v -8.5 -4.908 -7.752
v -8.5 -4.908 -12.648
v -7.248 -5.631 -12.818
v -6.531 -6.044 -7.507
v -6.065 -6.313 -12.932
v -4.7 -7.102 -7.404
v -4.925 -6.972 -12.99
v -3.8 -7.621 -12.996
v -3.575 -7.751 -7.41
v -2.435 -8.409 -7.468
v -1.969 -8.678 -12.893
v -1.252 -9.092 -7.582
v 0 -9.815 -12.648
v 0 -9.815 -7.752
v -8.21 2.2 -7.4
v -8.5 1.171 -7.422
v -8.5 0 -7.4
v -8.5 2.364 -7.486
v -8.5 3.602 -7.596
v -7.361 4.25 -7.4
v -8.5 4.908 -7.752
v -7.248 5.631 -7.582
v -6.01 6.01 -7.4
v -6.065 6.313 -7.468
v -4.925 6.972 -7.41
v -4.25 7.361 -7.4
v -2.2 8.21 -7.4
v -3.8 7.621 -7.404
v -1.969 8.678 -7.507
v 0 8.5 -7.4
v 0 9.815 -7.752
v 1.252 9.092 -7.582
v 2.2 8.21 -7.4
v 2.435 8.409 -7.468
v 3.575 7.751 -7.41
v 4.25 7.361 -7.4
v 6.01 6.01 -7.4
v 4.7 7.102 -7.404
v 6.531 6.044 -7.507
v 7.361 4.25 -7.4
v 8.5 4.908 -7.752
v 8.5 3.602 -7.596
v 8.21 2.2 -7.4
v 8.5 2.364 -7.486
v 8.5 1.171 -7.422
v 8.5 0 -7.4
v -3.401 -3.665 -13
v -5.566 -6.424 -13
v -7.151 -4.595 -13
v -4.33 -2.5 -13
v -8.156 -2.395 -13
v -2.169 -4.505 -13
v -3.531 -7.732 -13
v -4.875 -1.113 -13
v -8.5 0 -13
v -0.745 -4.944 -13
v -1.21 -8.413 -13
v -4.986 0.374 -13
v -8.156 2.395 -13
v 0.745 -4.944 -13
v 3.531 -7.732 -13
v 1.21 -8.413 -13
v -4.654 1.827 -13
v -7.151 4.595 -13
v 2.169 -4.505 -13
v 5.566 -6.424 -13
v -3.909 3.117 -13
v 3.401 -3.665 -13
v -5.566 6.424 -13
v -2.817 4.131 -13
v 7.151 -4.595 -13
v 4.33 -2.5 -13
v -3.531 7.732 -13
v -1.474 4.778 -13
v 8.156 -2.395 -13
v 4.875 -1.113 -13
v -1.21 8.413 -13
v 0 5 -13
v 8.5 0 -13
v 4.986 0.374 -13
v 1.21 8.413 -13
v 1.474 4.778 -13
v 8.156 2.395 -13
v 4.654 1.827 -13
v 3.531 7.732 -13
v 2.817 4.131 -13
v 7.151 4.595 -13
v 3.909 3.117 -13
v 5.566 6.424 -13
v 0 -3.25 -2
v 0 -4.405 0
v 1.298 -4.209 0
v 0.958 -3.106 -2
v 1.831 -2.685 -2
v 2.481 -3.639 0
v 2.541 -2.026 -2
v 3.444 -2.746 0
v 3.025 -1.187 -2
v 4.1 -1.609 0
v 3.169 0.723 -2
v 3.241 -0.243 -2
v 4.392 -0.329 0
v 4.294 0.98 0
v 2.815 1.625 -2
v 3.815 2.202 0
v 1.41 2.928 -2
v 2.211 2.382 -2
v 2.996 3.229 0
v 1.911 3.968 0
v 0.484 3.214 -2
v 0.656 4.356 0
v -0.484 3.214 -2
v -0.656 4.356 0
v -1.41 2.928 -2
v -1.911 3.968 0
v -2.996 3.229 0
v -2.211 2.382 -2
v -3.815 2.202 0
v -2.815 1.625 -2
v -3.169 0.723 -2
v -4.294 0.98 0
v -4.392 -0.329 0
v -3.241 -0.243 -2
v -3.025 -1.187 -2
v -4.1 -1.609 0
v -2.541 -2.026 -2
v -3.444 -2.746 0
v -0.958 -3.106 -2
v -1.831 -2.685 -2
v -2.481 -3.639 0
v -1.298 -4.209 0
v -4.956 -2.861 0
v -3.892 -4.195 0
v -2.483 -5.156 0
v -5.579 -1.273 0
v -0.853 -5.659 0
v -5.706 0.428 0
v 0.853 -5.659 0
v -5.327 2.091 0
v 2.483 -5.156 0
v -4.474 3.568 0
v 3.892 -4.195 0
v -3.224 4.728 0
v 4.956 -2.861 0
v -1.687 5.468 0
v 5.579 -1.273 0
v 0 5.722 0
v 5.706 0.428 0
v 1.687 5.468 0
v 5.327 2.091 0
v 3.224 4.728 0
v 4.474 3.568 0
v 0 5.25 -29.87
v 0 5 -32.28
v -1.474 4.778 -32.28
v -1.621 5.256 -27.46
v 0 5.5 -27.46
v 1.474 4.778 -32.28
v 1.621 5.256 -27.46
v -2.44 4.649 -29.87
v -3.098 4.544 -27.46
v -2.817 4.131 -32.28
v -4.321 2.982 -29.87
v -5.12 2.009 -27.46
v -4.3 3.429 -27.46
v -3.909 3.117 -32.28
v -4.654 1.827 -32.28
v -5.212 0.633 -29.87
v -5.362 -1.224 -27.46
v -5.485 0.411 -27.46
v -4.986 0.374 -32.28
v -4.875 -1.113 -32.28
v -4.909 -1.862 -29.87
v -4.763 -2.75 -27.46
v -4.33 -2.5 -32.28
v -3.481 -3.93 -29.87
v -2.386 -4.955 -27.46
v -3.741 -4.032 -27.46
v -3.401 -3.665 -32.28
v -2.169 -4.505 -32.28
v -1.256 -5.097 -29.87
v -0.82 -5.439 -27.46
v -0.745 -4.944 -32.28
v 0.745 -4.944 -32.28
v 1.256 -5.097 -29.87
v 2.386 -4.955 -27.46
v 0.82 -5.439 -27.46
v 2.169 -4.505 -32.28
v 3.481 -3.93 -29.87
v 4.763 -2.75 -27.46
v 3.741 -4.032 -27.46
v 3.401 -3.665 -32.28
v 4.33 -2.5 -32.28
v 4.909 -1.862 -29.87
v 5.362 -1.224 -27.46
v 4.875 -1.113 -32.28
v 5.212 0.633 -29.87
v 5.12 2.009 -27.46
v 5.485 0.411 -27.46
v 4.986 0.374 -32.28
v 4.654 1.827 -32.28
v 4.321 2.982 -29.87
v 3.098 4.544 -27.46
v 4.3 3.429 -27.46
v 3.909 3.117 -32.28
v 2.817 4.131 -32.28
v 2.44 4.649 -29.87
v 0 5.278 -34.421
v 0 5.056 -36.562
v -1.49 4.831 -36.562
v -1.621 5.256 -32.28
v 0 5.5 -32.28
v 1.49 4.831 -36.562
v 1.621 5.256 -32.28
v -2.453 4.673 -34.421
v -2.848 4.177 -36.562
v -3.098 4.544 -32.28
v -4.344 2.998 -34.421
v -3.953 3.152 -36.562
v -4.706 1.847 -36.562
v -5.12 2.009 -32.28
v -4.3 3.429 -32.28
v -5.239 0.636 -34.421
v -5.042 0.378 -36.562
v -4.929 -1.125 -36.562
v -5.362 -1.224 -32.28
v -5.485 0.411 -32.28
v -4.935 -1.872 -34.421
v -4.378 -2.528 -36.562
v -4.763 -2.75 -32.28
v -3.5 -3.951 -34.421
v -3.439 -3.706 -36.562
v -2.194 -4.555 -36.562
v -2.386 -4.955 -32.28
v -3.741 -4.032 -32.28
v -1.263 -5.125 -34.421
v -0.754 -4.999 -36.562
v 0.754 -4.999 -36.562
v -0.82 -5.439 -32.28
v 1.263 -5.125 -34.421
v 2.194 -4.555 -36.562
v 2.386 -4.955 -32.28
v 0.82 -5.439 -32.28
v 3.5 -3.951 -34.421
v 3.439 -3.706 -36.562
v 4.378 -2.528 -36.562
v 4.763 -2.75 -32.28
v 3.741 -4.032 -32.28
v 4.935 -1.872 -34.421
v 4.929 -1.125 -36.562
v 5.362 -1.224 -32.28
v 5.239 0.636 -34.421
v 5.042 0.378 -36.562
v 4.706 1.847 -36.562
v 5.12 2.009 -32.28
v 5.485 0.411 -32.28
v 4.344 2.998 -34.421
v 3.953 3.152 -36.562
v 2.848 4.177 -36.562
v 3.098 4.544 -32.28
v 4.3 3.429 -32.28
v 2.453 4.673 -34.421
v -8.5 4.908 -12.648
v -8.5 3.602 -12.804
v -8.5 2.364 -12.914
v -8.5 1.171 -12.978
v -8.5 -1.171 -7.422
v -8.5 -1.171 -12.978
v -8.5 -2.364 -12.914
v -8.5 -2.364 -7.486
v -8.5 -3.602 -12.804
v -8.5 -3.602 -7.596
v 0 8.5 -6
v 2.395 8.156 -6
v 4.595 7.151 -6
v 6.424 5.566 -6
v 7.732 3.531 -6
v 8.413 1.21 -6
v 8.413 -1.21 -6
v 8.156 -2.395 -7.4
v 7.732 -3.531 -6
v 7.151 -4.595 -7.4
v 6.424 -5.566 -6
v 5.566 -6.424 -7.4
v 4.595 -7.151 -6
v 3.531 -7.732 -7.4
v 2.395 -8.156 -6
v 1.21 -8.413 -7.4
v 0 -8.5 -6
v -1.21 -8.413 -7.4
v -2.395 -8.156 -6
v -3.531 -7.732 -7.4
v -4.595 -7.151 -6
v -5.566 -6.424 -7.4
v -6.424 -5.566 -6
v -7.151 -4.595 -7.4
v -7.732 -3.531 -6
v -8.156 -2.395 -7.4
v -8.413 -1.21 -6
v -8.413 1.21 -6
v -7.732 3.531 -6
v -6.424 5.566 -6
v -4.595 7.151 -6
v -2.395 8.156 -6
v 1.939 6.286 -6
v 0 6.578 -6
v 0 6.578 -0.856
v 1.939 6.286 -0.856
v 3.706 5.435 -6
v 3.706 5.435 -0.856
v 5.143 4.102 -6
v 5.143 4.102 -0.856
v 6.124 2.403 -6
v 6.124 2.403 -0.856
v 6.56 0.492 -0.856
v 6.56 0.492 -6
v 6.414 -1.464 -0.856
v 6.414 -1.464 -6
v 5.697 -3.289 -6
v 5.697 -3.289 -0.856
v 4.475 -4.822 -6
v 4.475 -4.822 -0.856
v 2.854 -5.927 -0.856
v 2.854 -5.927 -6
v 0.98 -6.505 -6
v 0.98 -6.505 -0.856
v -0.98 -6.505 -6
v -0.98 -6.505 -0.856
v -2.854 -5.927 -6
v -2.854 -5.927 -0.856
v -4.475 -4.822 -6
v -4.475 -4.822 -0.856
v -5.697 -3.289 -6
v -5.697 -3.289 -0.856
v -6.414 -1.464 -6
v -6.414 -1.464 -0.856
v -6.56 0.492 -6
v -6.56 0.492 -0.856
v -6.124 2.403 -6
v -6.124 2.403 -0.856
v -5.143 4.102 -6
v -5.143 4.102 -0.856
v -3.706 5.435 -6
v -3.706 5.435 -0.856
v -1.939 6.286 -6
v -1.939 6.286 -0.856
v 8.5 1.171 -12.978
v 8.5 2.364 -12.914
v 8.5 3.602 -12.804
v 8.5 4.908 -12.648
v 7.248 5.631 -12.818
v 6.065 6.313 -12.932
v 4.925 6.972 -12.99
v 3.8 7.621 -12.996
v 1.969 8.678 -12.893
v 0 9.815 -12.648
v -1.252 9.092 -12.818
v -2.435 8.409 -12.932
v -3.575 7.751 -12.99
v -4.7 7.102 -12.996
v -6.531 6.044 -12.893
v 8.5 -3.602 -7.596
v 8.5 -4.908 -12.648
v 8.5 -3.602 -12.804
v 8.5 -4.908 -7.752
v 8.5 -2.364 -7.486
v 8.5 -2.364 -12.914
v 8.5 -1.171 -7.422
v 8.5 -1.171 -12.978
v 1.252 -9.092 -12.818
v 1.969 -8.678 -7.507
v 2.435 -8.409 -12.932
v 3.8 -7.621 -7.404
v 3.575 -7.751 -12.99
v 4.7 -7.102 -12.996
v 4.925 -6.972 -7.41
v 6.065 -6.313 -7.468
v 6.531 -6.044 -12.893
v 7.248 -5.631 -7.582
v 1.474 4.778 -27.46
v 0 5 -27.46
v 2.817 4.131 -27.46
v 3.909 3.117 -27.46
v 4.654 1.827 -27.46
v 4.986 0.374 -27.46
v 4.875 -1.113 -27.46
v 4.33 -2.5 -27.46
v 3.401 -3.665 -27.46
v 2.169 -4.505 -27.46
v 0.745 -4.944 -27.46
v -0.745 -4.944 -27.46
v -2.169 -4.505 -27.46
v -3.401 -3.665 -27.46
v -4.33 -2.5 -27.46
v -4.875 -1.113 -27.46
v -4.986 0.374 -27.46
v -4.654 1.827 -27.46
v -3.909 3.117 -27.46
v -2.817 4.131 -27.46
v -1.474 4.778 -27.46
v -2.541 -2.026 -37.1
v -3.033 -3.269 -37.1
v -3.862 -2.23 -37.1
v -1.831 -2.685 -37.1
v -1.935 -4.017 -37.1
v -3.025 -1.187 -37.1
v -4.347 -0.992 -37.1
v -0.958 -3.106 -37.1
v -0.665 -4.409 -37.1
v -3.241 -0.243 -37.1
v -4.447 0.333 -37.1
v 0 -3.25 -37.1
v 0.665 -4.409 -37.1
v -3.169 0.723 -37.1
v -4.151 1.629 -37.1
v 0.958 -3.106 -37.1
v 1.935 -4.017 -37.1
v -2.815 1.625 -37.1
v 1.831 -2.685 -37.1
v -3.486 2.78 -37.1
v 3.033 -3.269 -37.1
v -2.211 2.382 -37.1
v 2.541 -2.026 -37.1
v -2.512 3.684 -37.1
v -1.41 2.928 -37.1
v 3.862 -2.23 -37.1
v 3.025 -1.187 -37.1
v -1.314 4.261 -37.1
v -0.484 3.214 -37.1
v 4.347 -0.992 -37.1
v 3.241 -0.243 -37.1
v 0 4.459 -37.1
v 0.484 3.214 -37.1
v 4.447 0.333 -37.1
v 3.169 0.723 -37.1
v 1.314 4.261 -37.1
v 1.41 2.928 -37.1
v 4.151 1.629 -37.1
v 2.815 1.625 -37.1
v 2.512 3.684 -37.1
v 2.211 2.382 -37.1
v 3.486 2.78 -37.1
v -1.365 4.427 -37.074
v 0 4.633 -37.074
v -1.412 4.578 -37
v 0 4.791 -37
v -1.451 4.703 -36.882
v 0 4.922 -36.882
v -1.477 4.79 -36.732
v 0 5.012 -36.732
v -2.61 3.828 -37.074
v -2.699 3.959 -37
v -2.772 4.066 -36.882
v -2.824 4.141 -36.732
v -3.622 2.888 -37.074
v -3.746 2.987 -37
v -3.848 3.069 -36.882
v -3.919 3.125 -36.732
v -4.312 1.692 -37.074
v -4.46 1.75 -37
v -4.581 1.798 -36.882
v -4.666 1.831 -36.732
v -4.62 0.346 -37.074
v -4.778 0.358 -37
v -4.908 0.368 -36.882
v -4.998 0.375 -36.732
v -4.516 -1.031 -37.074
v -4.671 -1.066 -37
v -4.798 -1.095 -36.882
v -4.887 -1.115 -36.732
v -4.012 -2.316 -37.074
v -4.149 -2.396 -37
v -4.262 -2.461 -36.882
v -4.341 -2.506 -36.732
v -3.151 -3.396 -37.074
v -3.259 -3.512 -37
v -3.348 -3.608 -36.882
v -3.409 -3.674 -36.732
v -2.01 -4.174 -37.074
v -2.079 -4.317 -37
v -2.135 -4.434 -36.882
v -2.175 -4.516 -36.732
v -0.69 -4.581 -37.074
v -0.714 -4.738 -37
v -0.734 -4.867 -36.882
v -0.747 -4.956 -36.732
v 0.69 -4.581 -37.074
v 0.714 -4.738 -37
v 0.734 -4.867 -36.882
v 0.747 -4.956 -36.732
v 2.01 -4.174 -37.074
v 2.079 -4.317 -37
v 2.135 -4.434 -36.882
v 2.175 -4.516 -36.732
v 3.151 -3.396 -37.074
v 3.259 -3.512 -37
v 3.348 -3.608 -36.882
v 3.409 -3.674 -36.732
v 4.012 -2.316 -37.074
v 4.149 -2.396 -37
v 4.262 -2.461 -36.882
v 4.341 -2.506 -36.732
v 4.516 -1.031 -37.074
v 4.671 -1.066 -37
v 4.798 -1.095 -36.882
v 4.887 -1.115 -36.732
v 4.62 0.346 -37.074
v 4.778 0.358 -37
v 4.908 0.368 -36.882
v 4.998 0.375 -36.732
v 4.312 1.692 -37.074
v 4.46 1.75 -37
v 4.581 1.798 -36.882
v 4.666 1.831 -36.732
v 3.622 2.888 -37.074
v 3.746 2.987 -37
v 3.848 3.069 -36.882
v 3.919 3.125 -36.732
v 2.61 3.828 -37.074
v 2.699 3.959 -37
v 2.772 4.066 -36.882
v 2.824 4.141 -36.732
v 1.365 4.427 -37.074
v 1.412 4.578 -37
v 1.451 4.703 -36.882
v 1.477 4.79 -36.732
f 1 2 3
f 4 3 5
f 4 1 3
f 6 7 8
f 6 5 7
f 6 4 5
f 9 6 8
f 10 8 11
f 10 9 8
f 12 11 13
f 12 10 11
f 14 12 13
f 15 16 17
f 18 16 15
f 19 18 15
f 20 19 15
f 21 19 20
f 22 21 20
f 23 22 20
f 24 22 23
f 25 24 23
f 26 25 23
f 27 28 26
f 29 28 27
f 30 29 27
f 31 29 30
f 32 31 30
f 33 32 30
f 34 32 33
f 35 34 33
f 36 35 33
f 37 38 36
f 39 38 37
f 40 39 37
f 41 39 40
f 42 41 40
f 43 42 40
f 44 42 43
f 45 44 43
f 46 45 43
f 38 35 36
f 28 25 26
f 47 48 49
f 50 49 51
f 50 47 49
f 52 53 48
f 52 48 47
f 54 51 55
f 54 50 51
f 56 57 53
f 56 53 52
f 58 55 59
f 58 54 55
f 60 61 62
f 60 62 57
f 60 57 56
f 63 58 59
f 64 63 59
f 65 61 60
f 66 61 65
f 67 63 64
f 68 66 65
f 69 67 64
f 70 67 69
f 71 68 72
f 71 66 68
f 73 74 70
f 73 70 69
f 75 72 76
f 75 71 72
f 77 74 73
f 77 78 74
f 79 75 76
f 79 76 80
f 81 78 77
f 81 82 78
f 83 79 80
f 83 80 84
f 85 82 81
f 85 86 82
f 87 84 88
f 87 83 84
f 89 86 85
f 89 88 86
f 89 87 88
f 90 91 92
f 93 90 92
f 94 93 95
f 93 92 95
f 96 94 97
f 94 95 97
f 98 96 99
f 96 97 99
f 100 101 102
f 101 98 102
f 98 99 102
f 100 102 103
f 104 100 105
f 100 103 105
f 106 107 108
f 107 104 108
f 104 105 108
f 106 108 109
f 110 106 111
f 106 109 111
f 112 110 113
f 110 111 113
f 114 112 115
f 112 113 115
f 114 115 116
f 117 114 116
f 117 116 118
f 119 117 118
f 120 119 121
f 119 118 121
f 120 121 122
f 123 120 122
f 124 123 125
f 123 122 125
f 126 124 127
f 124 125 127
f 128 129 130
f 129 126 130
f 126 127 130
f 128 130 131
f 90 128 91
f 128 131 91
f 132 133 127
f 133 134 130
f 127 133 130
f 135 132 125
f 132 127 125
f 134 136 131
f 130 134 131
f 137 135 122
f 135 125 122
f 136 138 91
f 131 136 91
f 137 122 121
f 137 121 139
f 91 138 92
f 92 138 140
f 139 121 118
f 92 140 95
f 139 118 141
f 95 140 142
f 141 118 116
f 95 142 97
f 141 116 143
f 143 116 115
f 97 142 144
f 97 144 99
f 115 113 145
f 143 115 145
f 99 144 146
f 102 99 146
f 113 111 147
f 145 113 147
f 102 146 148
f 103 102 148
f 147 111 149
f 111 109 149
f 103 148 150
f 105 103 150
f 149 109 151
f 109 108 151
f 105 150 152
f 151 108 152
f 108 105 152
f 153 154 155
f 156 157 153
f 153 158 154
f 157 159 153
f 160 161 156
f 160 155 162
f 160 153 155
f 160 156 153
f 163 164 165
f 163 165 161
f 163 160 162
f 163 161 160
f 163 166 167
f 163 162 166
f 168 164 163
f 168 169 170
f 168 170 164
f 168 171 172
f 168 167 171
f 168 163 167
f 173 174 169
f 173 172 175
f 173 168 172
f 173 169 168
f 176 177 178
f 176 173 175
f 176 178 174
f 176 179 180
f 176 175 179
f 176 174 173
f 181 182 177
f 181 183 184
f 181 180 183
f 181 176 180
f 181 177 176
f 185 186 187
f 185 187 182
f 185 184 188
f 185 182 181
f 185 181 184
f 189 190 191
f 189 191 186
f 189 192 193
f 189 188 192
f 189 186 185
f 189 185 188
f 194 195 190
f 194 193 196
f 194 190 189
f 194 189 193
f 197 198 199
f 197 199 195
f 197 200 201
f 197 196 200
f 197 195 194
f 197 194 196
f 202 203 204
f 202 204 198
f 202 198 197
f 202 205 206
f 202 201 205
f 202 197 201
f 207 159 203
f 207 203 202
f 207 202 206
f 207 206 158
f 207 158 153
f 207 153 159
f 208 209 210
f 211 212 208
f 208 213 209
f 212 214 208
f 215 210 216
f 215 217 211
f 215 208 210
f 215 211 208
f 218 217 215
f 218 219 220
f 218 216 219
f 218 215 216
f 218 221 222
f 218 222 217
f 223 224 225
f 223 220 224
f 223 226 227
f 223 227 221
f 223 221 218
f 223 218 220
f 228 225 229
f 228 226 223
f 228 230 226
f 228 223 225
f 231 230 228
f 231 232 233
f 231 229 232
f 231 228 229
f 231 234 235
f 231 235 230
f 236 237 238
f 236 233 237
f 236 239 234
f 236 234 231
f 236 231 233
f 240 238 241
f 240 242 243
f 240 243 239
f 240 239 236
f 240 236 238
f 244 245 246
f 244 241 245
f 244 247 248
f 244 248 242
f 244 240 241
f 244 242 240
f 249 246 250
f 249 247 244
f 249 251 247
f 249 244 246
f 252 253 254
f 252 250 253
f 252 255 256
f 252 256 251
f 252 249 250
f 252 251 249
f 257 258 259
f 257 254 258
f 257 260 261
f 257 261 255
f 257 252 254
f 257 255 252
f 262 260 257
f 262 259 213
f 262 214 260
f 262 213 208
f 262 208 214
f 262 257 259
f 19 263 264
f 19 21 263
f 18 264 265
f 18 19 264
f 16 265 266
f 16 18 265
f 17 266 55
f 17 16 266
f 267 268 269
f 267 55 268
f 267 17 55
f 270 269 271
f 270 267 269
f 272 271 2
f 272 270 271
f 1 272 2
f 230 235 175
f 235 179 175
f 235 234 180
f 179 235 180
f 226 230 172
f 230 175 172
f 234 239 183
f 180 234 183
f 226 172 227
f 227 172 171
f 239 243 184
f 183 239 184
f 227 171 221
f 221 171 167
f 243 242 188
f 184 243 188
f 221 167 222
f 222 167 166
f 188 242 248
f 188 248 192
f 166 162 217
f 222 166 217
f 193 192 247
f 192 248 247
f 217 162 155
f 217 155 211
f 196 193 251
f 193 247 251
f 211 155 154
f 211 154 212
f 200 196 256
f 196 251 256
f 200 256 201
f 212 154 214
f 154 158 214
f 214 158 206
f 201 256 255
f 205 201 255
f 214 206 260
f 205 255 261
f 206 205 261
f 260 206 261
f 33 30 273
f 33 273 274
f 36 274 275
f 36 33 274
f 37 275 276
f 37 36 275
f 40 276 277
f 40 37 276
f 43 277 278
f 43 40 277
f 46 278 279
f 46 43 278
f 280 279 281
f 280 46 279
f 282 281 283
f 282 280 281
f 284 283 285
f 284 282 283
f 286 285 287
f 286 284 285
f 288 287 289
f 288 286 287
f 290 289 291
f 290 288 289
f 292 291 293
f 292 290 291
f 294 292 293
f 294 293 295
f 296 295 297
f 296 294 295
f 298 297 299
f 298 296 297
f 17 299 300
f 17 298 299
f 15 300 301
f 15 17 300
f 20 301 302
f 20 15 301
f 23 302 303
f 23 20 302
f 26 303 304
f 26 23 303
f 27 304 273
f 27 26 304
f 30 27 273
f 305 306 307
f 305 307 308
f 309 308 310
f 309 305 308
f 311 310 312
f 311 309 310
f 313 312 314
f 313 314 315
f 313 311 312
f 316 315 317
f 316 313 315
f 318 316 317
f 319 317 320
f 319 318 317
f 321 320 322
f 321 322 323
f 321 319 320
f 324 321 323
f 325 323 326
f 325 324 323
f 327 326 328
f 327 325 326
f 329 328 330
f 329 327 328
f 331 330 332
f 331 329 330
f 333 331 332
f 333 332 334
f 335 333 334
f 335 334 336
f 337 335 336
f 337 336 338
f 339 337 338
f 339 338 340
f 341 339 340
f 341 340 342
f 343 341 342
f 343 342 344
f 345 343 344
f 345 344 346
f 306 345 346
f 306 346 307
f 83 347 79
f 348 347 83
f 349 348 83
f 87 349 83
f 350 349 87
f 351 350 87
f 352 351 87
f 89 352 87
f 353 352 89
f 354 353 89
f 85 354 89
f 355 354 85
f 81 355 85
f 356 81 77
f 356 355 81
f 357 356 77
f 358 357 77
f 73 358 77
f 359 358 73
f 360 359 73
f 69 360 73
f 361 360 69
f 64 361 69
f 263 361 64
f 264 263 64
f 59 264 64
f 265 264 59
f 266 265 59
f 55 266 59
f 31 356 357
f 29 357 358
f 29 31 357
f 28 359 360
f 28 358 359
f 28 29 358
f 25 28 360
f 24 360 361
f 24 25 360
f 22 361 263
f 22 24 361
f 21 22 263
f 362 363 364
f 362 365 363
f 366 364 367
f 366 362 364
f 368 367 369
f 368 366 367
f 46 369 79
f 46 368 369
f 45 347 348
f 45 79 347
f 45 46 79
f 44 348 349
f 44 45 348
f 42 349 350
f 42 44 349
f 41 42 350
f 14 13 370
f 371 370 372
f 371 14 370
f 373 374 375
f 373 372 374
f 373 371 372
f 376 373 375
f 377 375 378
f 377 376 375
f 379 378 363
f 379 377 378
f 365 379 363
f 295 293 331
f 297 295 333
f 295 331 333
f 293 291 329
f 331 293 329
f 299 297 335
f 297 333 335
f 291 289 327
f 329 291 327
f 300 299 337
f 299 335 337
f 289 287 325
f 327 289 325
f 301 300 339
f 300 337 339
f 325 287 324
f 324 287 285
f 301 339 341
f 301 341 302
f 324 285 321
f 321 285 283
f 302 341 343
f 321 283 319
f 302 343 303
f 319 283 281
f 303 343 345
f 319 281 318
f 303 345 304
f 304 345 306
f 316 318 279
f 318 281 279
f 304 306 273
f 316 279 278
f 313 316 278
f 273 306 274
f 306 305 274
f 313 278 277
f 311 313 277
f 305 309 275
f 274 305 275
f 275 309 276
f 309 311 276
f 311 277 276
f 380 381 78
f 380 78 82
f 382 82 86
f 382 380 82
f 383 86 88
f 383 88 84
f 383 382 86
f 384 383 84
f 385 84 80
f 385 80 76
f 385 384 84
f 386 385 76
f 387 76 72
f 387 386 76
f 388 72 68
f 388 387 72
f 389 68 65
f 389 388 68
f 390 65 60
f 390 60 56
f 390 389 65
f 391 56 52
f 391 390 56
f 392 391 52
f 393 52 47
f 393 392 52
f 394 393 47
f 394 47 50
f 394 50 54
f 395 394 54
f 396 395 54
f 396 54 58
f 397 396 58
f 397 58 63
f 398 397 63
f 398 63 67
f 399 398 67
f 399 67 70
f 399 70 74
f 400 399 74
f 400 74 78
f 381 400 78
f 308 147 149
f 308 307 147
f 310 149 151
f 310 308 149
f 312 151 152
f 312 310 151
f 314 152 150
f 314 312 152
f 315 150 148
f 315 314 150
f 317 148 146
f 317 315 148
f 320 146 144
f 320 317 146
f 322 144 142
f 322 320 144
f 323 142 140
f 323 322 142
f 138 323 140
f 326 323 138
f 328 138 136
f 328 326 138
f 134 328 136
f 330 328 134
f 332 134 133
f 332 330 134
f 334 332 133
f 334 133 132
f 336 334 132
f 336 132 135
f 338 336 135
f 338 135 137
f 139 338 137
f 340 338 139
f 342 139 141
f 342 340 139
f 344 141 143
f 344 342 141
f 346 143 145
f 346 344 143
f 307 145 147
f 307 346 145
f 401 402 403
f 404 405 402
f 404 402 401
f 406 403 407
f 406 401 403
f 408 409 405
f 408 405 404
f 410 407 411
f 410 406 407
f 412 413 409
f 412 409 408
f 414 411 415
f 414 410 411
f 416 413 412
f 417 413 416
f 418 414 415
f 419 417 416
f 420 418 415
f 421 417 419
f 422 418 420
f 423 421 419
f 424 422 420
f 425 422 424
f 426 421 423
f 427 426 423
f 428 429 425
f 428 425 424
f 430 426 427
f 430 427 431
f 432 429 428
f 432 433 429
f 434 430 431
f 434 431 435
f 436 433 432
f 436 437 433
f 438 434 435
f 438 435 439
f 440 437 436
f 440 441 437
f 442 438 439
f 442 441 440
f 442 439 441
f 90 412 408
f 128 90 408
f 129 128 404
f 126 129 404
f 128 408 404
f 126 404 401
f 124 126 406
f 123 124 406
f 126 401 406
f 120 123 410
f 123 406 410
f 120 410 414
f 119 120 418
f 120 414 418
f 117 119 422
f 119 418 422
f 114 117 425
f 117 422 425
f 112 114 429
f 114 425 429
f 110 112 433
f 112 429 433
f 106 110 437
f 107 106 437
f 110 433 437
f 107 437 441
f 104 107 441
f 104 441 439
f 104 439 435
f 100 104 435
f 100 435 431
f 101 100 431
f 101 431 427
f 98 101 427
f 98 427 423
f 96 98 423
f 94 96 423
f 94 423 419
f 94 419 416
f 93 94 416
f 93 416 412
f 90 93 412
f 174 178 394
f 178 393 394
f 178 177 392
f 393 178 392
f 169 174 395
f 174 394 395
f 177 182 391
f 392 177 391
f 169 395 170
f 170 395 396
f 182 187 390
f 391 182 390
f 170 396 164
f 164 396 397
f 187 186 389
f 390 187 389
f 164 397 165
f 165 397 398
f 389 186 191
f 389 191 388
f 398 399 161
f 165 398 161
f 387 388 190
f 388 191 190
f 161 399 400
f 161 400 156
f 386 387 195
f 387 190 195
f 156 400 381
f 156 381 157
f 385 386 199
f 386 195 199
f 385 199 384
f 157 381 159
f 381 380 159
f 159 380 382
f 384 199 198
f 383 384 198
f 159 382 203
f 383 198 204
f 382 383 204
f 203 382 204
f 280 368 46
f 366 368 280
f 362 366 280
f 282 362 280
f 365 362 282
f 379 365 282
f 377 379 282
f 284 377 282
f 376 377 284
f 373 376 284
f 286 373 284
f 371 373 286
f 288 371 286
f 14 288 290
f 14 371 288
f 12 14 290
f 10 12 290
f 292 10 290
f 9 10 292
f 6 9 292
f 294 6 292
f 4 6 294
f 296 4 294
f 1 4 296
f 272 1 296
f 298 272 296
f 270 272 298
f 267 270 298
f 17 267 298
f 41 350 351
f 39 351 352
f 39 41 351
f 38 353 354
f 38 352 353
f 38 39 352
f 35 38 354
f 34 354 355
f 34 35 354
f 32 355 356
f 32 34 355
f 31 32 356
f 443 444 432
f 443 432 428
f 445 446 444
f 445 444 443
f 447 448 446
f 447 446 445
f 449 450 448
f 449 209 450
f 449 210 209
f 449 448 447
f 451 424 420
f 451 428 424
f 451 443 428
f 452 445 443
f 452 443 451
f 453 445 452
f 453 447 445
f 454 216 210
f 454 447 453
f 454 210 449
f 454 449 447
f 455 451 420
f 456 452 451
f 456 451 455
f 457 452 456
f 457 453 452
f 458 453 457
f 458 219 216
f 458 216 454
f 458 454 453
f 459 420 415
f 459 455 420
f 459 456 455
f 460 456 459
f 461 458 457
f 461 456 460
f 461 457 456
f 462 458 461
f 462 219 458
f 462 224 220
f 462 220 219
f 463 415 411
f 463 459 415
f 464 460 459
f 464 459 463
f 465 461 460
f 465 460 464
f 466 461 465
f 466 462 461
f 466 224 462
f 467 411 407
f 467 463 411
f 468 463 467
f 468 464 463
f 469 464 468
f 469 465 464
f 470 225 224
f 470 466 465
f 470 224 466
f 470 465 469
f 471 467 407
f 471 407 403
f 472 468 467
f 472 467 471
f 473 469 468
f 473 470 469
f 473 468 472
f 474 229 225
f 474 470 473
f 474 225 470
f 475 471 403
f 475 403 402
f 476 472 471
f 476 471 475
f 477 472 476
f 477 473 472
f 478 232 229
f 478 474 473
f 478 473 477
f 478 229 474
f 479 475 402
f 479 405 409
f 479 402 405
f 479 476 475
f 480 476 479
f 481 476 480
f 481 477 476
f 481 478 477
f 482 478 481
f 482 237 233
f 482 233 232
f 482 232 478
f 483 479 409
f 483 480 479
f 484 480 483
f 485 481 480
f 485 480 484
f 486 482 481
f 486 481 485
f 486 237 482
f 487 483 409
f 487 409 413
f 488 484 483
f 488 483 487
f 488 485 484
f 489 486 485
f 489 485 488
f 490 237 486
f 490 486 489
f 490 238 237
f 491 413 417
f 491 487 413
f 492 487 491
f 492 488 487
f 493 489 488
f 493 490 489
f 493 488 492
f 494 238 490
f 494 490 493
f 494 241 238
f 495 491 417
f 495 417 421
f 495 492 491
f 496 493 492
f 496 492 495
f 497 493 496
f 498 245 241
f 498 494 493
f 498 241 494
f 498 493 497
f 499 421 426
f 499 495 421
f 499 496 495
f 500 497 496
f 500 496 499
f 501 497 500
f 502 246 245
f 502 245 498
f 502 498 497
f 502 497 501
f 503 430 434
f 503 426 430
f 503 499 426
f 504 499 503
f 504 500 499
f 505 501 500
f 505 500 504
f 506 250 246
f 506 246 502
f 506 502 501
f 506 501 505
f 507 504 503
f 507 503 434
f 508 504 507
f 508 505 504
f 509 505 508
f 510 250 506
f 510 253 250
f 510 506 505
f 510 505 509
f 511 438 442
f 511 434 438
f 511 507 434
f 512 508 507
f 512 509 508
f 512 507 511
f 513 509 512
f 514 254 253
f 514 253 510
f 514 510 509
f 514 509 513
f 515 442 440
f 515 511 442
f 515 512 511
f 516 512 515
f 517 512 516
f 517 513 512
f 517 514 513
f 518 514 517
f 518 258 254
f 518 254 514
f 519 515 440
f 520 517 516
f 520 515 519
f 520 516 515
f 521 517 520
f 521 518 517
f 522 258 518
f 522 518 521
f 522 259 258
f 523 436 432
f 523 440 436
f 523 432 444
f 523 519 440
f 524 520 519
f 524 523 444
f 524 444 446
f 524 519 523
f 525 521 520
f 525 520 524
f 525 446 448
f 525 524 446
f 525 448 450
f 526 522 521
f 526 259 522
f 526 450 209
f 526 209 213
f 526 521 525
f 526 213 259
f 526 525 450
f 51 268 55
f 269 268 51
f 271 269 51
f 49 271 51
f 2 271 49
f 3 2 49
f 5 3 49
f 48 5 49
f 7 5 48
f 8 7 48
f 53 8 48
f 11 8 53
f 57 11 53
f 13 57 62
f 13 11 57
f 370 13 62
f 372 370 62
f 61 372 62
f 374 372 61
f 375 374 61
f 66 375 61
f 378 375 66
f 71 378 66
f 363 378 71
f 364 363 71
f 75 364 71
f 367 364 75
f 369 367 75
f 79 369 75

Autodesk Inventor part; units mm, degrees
sketch "Skizze_1" plane through (0, 0, 0) normal (1, 0, 0) x (0, 1, 0)
  line L0 (0, -37.1) -> (0, 0)
  line L1 (0, 0) -> (5.7225, 0)
  line L2 (5.7225, 0) -> (6.5785, -0.856)
  line L3 (6.5785, -0.856) -> (6.5785, -6)
  line L4 (6.5785, -6) -> (8.5, -6)
  line L5 (8.5, -6) -> (8.5, -7.4)
  line L6 (8.5, -7.4) -> (10.2, -7.8555)
  line L7 (10.2, -7.8555) -> (10.2, -12.5445)
  line L8 (10.2, -12.5445) -> (8.5, -13)
  line L9 (8.5, -13) -> (5, -13)
  line L10 (5, -13) -> (5, -27.46)
  line L11 (5, -27.46) -> (5.5, -27.46)
  line L12 (5.5, -27.46) -> (5, -32.28)
  line L13 (5, -32.28) -> (5.5, -32.28)
  line L14 (5.5, -32.28) -> (5.0558, -36.5619)
  arc A0 (4.459, -37.1) -> (5.0558, -36.5619) centre (4.459, -36.5) ccw
  line L15 (4.459, -37.1) -> (0, -37.1)
  line L16 (0, -37.1) -> (0, 0)
revolve "Revolution1" add sketch "Skizze_1" angle 360 about axis through (0, 0, -37.1) along (0, 0, -1)
thread "Thread1" size "G13.157x1.337" designation "G 1/4" class "A" standard "ISO Pipe Threads" length 4.144
sketch "Sketch2" plane through (0, 0, 0) normal (0, 0, 1) x (1, 0, 0)
  point P0 (0, 0)
hole "Hole1" at (0, 0, 0) direction (0, 0, -1) diameter 6.5 depth 37.1 countersink diameter 8.8094 countersink angle 60
sketch "Skizze_3" plane through (0, 0, 0) normal (0, 0, 1) x (1, 0, 0)
  line L0 (-17, -17) -> (17, -17)
  line L1 (17, -17) -> (17, 17)
  line L2 (17, 17) -> (-17, 17)
  line L3 (-17, 17) -> (-17, -17)
  line L4 (-8.5, -4.9075) -> (0, -9.815)
  line L5 (0, -9.815) -> (8.5, -4.9075)
  line L6 (8.5, -4.9075) -> (8.5, 4.9075)
  line L7 (8.5, 4.9075) -> (0, 9.815)
  line L8 (0, 9.815) -> (-8.5, 4.9075)
  line L9 (-8.5, 4.9075) -> (-8.5, -4.9075)
extrude "Extrusion1" cut sketch "Skizze_3" against normal blind 13
ref_plane "ANBAU_XY" through (0, 0, -6) normal (0, 0, -1) x (1, 0, 0)
ref_plane "ANBAU_YZ" through (0, 0, -6) normal (1, 0, 0) x (0, -1, 0)
ref_plane "ANBAU_ZX" through (0, 0, -6) normal (0, -1, 0) x (0, 0, -1)
ref_plane "ANBAU_STD_XY" through (0, 0, -6) normal (0, 0, -1) x (1, 0, 0)
ref_plane "ANBAU_STD_YZ" through (0, 0, -6) normal (1, 0, 0) x (0, -1, 0)
ref_plane "ANBAU_STD_ZX" through (0, 0, -6) normal (0, -1, 0) x (0, 0, -1)
properties part number "3607 N-1/4-P-9"
